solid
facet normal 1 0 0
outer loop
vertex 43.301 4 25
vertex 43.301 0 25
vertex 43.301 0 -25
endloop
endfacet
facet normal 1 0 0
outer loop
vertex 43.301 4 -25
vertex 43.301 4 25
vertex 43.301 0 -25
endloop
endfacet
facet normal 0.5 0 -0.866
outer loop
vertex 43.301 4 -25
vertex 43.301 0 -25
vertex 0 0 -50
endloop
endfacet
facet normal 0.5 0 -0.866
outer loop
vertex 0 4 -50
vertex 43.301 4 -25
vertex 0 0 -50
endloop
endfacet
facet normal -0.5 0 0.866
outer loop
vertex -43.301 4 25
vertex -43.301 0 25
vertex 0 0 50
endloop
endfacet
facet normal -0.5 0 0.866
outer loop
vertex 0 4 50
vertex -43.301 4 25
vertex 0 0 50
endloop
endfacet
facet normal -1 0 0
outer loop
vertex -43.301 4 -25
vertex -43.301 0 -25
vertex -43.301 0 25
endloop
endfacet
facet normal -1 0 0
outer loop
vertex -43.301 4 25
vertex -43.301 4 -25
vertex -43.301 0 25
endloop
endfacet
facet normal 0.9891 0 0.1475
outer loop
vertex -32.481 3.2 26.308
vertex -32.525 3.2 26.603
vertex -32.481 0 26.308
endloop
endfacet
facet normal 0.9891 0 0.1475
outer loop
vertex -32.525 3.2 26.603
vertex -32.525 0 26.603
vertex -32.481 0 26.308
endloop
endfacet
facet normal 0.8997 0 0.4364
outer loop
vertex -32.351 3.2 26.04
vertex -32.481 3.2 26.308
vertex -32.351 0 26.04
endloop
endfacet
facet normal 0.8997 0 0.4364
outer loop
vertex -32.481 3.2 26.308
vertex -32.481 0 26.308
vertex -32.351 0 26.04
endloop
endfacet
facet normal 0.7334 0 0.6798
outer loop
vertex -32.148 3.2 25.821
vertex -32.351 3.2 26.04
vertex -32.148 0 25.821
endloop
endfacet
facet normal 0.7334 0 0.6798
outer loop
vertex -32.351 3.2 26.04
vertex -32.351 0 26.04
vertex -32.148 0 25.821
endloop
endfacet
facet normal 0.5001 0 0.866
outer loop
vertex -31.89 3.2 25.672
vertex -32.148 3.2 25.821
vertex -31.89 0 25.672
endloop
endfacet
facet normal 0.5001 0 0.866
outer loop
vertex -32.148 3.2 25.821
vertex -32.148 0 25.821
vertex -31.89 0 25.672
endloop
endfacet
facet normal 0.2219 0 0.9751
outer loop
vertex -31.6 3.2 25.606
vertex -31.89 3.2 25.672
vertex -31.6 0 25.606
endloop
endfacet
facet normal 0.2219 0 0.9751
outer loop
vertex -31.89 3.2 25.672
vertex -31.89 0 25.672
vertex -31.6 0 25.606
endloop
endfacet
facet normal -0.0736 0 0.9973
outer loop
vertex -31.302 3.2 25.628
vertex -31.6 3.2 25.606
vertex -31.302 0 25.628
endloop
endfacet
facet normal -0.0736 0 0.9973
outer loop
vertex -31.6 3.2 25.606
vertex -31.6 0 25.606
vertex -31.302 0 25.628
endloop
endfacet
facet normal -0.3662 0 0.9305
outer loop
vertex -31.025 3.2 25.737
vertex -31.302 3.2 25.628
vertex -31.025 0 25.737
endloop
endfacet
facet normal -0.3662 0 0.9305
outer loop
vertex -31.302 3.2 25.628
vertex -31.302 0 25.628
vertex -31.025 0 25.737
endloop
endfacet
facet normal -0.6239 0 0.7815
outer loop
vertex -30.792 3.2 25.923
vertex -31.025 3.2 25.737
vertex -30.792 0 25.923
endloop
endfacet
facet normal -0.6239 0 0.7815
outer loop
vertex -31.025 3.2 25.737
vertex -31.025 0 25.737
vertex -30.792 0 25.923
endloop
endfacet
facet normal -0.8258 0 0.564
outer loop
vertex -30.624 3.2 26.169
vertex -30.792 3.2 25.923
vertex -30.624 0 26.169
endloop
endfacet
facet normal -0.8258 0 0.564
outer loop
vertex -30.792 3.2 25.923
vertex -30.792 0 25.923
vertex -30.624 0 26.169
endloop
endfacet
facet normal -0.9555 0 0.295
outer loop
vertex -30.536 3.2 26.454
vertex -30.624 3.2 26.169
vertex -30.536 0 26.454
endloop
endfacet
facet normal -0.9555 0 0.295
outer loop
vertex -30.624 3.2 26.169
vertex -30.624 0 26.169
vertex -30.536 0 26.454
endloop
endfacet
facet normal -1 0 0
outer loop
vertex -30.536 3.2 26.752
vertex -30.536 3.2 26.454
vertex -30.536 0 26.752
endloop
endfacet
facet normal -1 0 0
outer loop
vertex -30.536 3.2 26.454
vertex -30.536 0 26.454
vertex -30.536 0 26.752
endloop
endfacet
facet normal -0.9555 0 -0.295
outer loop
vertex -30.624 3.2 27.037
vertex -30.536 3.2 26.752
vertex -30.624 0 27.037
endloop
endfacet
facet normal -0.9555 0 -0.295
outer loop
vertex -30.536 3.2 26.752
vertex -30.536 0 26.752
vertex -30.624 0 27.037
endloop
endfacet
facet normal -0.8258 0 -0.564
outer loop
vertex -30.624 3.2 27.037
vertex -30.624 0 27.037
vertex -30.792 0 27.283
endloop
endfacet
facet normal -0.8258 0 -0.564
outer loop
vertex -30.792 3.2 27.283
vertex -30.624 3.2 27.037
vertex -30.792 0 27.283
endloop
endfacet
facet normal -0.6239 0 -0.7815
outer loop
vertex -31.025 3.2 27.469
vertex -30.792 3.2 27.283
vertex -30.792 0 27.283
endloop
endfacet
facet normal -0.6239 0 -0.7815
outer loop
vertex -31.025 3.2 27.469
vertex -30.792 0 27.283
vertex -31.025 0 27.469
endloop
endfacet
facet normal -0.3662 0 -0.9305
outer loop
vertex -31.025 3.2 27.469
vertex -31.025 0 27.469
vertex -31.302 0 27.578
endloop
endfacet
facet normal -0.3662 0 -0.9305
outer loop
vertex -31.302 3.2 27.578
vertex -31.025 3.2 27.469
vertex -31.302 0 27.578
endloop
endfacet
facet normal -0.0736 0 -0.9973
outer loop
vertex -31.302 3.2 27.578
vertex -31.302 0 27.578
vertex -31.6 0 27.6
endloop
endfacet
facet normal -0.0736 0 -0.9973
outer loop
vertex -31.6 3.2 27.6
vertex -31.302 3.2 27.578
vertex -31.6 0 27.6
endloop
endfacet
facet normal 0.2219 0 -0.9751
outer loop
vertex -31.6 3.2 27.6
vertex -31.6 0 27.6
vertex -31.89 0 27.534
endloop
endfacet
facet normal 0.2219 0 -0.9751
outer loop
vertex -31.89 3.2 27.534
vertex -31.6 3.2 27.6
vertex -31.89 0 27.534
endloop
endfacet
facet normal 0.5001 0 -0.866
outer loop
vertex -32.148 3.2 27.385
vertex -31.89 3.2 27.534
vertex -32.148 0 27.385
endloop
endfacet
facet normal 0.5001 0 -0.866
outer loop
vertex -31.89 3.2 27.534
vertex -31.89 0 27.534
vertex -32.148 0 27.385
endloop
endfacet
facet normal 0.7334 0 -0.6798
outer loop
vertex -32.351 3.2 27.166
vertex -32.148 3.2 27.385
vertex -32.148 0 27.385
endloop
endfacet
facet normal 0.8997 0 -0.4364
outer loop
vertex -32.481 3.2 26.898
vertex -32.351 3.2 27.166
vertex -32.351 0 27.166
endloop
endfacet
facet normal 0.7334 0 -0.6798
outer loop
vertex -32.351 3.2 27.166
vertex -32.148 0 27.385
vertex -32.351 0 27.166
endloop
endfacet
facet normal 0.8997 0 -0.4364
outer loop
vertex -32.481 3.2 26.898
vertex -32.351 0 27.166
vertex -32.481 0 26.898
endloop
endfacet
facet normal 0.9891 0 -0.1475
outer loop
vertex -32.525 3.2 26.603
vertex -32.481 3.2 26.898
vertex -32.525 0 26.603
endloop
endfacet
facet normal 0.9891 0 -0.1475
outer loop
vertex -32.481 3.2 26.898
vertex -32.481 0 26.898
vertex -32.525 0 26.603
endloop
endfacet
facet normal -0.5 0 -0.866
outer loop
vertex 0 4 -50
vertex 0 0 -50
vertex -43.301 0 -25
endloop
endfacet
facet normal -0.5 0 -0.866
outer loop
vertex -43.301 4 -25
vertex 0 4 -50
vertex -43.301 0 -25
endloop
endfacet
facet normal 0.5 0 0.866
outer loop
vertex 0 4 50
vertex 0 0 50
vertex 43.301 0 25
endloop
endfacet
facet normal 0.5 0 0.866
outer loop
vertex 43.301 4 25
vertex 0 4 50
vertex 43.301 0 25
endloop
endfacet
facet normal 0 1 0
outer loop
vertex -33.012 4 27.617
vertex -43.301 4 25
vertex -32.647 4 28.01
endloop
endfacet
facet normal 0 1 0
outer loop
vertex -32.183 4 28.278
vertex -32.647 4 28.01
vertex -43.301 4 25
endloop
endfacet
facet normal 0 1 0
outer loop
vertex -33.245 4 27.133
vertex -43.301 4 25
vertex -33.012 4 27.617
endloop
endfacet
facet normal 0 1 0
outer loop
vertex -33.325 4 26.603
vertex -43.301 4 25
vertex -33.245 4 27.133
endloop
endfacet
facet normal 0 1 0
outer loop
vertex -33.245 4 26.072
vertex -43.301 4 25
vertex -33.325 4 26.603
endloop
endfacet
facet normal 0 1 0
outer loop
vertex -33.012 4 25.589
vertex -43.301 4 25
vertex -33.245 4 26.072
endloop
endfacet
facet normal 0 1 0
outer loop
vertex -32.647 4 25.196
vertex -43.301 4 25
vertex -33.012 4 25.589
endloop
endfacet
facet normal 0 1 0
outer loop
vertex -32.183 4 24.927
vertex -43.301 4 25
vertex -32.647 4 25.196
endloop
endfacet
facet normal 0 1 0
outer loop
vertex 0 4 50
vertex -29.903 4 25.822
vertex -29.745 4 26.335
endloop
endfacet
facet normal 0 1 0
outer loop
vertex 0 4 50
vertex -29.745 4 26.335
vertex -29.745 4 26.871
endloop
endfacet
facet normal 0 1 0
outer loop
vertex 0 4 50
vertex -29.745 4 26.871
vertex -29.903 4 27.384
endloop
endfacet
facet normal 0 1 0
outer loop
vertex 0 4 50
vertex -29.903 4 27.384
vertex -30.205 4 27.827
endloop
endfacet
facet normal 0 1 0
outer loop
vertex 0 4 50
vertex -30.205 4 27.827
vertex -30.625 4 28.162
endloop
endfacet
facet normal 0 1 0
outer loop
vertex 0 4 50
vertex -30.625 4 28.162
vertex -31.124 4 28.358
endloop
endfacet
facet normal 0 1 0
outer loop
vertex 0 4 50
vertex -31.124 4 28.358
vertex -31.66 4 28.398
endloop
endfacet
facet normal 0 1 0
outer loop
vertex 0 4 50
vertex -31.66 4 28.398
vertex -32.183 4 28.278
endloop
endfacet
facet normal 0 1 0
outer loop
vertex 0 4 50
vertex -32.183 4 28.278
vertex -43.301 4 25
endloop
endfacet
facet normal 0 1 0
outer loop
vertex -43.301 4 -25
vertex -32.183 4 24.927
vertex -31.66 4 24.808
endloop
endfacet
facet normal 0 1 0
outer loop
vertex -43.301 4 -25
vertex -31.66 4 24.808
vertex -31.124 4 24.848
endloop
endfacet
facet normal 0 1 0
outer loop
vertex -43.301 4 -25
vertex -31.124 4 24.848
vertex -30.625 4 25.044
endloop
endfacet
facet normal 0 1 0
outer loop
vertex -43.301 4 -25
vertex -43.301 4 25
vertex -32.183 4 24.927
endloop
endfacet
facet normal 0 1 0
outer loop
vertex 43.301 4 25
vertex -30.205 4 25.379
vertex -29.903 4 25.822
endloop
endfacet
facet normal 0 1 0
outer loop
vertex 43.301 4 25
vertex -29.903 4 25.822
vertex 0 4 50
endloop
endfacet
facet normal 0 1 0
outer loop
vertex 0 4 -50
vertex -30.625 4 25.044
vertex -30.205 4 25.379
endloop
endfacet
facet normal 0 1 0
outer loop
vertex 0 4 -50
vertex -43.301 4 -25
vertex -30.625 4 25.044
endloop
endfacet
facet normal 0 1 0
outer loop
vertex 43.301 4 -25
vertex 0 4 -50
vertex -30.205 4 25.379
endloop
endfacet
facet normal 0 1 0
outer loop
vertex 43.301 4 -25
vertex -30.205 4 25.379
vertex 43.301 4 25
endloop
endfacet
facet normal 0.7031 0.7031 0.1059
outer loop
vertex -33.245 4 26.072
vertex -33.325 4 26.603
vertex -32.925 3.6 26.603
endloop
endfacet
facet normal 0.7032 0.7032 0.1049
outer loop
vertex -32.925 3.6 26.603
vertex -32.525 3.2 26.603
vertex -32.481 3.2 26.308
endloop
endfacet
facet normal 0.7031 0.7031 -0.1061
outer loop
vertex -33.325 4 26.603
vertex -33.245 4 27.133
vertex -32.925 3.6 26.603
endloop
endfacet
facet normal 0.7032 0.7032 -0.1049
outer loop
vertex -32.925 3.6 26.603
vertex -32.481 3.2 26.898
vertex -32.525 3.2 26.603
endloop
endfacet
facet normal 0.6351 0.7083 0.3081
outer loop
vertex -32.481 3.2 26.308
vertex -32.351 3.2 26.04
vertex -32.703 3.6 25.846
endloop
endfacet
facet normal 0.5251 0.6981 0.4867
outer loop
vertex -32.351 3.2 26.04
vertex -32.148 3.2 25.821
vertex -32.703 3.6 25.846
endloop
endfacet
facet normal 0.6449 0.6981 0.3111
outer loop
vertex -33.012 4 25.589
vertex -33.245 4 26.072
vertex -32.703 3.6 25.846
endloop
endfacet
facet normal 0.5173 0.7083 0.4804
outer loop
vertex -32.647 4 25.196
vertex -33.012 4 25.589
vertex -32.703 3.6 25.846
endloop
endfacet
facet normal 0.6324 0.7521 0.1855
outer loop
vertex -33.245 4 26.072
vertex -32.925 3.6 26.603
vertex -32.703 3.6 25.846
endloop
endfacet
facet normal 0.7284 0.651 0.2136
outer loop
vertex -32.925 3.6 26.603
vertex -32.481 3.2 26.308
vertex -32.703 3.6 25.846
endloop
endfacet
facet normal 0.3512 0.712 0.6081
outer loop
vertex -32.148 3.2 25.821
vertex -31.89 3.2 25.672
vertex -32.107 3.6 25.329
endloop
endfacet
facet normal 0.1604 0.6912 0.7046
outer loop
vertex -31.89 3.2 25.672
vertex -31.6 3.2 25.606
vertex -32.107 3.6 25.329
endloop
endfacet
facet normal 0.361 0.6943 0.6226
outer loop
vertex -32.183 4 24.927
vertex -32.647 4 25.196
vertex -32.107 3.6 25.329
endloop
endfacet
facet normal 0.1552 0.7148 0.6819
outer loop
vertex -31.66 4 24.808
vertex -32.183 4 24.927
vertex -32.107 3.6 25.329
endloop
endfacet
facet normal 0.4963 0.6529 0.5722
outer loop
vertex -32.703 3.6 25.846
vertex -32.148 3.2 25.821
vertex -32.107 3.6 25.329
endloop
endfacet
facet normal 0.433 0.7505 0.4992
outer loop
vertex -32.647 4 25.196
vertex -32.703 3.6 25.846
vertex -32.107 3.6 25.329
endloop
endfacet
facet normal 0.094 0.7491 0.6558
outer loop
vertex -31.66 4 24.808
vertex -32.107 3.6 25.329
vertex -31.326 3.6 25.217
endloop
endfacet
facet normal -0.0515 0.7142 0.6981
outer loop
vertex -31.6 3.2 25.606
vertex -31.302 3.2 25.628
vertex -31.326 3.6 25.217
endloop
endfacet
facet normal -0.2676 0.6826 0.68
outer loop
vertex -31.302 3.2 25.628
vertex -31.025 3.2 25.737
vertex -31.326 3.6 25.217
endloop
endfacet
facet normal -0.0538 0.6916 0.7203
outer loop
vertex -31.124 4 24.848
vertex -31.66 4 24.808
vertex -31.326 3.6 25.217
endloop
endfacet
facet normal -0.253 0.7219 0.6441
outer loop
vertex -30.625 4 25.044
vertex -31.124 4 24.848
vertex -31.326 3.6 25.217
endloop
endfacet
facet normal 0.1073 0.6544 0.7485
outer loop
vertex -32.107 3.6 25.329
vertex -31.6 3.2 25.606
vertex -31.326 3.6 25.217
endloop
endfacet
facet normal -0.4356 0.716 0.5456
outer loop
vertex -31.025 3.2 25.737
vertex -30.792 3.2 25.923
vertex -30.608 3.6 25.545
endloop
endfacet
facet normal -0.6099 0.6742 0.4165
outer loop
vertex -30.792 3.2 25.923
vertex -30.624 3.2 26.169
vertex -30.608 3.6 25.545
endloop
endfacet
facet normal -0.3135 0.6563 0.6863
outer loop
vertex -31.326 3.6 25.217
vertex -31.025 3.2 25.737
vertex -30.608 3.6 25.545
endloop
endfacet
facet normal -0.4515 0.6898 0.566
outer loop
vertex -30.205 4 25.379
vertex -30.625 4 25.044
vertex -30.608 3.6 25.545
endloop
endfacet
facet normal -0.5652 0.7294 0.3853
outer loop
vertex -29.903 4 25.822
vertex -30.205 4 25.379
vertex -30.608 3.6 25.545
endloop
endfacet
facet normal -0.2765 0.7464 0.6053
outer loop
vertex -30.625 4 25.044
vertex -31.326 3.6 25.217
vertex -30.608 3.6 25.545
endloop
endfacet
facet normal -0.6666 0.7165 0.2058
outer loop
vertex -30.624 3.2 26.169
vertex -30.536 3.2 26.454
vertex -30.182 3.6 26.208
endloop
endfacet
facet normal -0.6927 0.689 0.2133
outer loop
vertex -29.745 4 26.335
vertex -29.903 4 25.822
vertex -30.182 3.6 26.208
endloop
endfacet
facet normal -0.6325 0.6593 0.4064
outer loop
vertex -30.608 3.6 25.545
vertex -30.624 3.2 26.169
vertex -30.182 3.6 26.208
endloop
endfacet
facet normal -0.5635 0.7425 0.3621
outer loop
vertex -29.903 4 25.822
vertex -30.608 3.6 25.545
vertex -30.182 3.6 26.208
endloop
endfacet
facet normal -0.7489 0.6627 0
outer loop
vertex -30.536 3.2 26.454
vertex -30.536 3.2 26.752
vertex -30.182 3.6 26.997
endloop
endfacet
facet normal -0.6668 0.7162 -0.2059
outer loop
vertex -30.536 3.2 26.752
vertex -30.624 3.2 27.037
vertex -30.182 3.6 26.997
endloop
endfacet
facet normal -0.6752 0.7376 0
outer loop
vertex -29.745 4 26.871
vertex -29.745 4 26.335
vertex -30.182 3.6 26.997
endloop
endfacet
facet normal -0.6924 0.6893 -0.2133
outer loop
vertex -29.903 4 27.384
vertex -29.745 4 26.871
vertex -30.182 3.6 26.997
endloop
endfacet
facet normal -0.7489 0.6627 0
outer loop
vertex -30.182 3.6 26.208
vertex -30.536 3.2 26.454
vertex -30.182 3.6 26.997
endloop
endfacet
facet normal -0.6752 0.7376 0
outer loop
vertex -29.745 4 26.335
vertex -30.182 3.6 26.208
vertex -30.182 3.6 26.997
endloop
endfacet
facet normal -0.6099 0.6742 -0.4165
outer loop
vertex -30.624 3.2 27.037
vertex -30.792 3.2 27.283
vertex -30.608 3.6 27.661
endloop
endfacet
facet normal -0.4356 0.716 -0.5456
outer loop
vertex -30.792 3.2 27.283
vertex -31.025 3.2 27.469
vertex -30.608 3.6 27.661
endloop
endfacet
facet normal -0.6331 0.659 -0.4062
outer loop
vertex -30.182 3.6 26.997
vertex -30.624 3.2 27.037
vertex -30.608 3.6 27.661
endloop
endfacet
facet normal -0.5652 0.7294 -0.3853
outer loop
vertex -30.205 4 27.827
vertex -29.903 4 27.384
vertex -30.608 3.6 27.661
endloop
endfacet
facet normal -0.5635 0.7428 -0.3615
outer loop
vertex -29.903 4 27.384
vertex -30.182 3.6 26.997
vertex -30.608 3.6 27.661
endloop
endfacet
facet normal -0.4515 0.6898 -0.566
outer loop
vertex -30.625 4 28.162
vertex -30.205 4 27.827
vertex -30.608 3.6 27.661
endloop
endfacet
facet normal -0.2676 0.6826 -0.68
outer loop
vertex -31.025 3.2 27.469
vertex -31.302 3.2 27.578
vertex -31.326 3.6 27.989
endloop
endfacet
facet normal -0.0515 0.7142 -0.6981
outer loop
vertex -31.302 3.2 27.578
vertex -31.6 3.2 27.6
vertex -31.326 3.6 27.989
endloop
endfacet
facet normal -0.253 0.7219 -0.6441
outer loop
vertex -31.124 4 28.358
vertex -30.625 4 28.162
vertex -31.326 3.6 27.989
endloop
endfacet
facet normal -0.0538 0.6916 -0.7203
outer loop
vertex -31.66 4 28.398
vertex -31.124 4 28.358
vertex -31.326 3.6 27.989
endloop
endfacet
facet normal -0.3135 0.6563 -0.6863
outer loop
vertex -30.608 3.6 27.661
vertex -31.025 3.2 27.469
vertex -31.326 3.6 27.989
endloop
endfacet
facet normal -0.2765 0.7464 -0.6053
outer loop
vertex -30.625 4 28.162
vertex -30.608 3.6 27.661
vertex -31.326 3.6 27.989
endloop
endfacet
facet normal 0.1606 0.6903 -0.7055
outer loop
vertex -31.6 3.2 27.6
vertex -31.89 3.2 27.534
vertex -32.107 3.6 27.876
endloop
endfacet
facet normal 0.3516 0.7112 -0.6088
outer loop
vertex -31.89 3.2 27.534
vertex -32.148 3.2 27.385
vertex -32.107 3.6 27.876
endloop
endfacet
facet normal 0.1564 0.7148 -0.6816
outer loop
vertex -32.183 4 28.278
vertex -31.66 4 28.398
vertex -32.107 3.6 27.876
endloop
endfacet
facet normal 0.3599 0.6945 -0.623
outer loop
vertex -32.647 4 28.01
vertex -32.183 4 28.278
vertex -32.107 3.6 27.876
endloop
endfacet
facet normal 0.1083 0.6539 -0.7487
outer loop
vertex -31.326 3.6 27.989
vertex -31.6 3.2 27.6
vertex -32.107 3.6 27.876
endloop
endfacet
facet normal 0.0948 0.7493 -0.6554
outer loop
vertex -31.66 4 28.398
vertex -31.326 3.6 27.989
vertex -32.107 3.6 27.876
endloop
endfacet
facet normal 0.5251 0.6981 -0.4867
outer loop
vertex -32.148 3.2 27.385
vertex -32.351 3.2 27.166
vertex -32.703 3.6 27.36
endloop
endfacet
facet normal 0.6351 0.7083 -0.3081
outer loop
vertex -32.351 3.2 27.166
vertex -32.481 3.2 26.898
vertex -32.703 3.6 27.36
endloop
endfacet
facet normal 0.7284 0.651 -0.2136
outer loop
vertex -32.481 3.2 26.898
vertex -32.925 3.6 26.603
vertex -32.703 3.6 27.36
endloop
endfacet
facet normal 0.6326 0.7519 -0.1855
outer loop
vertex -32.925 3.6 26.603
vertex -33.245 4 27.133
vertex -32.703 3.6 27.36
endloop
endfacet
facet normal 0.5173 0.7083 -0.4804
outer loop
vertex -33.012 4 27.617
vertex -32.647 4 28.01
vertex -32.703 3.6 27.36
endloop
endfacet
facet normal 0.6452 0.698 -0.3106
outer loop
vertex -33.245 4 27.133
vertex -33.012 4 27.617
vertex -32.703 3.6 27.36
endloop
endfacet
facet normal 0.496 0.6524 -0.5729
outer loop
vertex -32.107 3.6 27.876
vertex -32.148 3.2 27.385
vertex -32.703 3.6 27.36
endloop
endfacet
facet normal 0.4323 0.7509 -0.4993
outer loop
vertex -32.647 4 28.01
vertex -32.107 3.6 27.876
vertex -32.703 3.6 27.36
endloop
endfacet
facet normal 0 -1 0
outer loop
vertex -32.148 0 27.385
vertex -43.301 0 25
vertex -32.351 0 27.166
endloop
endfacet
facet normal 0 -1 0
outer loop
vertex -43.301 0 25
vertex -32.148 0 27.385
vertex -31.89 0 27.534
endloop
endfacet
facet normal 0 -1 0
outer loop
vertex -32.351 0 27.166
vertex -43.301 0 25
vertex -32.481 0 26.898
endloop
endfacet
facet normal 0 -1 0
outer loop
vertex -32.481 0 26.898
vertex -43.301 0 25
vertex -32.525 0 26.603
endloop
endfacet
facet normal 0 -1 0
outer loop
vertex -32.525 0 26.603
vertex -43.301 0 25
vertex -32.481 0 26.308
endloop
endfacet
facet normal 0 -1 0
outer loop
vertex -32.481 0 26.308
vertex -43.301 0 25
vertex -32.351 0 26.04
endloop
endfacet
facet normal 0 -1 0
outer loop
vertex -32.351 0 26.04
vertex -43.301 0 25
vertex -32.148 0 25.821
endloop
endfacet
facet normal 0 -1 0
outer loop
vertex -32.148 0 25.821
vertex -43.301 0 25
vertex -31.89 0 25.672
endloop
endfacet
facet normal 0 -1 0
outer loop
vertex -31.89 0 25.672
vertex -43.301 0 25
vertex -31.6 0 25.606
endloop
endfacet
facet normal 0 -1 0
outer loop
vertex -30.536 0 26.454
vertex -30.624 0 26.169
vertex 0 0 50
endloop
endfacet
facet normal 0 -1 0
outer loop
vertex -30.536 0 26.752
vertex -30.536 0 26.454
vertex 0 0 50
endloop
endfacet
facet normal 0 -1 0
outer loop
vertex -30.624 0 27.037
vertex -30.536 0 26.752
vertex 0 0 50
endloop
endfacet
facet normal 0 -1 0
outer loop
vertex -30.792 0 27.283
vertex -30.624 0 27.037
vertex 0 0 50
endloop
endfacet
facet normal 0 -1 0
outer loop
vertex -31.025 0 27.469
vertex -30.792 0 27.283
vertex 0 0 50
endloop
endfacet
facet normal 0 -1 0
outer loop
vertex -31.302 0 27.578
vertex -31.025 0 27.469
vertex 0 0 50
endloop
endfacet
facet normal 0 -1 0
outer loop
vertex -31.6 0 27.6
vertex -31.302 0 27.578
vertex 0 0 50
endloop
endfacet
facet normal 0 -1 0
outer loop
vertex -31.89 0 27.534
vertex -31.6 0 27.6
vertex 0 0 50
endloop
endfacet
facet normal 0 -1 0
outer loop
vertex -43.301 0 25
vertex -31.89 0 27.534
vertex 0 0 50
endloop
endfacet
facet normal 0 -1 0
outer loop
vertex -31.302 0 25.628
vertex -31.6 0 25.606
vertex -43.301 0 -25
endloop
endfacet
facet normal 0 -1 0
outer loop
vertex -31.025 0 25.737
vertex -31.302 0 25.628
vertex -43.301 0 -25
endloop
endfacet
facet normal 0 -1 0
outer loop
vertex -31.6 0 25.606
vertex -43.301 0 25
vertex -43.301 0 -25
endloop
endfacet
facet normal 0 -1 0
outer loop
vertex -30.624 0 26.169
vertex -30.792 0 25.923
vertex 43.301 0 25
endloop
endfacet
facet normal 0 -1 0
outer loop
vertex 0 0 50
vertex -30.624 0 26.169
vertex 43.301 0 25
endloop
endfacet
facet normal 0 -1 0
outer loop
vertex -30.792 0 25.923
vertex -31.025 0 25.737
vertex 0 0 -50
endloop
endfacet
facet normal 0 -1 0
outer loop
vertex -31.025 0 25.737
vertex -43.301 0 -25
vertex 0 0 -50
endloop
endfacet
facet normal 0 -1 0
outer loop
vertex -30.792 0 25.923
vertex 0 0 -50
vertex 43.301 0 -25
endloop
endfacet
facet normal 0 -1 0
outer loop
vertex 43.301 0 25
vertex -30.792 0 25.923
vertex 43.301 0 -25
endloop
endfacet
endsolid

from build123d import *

# Parameters (mm, degrees)
BOSS_EXTRUDE1_DEPTH                                  = 4
CSK_FOR_M1_6_COUNTERSUNK_FLAT_HEAD_SCREW_D           = 2
CSK_FOR_M1_6_COUNTERSUNK_FLAT_HEAD_SCREW_CSINK_D     = 3.6
CSK_FOR_M1_6_COUNTERSUNK_FLAT_HEAD_SCREW_CSINK_ANGLE = 90


with BuildPart() as part:
    # Sketch1 → Boss-Extrude1 (new body)
    with BuildSketch(Plane(origin=(0, 0, 0), x_dir=(1, 0, 0), z_dir=(0, 1, 0))):
        Polygon((0, 50), (-43.301270189, 25), (-43.301270189, -25), (0, -50), (43.301270189, -25), (43.301270189, 25), align=None)
    extrude(amount=BOSS_EXTRUDE1_DEPTH)

    # CSK for M1.6 Countersunk Flat Head Screw1 (through all)
    with Locations(Plane(origin=(-40.56776455, 4, -91.833285009), x_dir=(1, 0, 0), z_dir=(0, 1, 0))):
        with Locations((9.042773802, -118.436170692)):
            CounterSinkHole(CSK_FOR_M1_6_COUNTERSUNK_FLAT_HEAD_SCREW_D / 2, CSK_FOR_M1_6_COUNTERSUNK_FLAT_HEAD_SCREW_CSINK_D / 2, counter_sink_angle=CSK_FOR_M1_6_COUNTERSUNK_FLAT_HEAD_SCREW_CSINK_ANGLE)


solid = part.part
